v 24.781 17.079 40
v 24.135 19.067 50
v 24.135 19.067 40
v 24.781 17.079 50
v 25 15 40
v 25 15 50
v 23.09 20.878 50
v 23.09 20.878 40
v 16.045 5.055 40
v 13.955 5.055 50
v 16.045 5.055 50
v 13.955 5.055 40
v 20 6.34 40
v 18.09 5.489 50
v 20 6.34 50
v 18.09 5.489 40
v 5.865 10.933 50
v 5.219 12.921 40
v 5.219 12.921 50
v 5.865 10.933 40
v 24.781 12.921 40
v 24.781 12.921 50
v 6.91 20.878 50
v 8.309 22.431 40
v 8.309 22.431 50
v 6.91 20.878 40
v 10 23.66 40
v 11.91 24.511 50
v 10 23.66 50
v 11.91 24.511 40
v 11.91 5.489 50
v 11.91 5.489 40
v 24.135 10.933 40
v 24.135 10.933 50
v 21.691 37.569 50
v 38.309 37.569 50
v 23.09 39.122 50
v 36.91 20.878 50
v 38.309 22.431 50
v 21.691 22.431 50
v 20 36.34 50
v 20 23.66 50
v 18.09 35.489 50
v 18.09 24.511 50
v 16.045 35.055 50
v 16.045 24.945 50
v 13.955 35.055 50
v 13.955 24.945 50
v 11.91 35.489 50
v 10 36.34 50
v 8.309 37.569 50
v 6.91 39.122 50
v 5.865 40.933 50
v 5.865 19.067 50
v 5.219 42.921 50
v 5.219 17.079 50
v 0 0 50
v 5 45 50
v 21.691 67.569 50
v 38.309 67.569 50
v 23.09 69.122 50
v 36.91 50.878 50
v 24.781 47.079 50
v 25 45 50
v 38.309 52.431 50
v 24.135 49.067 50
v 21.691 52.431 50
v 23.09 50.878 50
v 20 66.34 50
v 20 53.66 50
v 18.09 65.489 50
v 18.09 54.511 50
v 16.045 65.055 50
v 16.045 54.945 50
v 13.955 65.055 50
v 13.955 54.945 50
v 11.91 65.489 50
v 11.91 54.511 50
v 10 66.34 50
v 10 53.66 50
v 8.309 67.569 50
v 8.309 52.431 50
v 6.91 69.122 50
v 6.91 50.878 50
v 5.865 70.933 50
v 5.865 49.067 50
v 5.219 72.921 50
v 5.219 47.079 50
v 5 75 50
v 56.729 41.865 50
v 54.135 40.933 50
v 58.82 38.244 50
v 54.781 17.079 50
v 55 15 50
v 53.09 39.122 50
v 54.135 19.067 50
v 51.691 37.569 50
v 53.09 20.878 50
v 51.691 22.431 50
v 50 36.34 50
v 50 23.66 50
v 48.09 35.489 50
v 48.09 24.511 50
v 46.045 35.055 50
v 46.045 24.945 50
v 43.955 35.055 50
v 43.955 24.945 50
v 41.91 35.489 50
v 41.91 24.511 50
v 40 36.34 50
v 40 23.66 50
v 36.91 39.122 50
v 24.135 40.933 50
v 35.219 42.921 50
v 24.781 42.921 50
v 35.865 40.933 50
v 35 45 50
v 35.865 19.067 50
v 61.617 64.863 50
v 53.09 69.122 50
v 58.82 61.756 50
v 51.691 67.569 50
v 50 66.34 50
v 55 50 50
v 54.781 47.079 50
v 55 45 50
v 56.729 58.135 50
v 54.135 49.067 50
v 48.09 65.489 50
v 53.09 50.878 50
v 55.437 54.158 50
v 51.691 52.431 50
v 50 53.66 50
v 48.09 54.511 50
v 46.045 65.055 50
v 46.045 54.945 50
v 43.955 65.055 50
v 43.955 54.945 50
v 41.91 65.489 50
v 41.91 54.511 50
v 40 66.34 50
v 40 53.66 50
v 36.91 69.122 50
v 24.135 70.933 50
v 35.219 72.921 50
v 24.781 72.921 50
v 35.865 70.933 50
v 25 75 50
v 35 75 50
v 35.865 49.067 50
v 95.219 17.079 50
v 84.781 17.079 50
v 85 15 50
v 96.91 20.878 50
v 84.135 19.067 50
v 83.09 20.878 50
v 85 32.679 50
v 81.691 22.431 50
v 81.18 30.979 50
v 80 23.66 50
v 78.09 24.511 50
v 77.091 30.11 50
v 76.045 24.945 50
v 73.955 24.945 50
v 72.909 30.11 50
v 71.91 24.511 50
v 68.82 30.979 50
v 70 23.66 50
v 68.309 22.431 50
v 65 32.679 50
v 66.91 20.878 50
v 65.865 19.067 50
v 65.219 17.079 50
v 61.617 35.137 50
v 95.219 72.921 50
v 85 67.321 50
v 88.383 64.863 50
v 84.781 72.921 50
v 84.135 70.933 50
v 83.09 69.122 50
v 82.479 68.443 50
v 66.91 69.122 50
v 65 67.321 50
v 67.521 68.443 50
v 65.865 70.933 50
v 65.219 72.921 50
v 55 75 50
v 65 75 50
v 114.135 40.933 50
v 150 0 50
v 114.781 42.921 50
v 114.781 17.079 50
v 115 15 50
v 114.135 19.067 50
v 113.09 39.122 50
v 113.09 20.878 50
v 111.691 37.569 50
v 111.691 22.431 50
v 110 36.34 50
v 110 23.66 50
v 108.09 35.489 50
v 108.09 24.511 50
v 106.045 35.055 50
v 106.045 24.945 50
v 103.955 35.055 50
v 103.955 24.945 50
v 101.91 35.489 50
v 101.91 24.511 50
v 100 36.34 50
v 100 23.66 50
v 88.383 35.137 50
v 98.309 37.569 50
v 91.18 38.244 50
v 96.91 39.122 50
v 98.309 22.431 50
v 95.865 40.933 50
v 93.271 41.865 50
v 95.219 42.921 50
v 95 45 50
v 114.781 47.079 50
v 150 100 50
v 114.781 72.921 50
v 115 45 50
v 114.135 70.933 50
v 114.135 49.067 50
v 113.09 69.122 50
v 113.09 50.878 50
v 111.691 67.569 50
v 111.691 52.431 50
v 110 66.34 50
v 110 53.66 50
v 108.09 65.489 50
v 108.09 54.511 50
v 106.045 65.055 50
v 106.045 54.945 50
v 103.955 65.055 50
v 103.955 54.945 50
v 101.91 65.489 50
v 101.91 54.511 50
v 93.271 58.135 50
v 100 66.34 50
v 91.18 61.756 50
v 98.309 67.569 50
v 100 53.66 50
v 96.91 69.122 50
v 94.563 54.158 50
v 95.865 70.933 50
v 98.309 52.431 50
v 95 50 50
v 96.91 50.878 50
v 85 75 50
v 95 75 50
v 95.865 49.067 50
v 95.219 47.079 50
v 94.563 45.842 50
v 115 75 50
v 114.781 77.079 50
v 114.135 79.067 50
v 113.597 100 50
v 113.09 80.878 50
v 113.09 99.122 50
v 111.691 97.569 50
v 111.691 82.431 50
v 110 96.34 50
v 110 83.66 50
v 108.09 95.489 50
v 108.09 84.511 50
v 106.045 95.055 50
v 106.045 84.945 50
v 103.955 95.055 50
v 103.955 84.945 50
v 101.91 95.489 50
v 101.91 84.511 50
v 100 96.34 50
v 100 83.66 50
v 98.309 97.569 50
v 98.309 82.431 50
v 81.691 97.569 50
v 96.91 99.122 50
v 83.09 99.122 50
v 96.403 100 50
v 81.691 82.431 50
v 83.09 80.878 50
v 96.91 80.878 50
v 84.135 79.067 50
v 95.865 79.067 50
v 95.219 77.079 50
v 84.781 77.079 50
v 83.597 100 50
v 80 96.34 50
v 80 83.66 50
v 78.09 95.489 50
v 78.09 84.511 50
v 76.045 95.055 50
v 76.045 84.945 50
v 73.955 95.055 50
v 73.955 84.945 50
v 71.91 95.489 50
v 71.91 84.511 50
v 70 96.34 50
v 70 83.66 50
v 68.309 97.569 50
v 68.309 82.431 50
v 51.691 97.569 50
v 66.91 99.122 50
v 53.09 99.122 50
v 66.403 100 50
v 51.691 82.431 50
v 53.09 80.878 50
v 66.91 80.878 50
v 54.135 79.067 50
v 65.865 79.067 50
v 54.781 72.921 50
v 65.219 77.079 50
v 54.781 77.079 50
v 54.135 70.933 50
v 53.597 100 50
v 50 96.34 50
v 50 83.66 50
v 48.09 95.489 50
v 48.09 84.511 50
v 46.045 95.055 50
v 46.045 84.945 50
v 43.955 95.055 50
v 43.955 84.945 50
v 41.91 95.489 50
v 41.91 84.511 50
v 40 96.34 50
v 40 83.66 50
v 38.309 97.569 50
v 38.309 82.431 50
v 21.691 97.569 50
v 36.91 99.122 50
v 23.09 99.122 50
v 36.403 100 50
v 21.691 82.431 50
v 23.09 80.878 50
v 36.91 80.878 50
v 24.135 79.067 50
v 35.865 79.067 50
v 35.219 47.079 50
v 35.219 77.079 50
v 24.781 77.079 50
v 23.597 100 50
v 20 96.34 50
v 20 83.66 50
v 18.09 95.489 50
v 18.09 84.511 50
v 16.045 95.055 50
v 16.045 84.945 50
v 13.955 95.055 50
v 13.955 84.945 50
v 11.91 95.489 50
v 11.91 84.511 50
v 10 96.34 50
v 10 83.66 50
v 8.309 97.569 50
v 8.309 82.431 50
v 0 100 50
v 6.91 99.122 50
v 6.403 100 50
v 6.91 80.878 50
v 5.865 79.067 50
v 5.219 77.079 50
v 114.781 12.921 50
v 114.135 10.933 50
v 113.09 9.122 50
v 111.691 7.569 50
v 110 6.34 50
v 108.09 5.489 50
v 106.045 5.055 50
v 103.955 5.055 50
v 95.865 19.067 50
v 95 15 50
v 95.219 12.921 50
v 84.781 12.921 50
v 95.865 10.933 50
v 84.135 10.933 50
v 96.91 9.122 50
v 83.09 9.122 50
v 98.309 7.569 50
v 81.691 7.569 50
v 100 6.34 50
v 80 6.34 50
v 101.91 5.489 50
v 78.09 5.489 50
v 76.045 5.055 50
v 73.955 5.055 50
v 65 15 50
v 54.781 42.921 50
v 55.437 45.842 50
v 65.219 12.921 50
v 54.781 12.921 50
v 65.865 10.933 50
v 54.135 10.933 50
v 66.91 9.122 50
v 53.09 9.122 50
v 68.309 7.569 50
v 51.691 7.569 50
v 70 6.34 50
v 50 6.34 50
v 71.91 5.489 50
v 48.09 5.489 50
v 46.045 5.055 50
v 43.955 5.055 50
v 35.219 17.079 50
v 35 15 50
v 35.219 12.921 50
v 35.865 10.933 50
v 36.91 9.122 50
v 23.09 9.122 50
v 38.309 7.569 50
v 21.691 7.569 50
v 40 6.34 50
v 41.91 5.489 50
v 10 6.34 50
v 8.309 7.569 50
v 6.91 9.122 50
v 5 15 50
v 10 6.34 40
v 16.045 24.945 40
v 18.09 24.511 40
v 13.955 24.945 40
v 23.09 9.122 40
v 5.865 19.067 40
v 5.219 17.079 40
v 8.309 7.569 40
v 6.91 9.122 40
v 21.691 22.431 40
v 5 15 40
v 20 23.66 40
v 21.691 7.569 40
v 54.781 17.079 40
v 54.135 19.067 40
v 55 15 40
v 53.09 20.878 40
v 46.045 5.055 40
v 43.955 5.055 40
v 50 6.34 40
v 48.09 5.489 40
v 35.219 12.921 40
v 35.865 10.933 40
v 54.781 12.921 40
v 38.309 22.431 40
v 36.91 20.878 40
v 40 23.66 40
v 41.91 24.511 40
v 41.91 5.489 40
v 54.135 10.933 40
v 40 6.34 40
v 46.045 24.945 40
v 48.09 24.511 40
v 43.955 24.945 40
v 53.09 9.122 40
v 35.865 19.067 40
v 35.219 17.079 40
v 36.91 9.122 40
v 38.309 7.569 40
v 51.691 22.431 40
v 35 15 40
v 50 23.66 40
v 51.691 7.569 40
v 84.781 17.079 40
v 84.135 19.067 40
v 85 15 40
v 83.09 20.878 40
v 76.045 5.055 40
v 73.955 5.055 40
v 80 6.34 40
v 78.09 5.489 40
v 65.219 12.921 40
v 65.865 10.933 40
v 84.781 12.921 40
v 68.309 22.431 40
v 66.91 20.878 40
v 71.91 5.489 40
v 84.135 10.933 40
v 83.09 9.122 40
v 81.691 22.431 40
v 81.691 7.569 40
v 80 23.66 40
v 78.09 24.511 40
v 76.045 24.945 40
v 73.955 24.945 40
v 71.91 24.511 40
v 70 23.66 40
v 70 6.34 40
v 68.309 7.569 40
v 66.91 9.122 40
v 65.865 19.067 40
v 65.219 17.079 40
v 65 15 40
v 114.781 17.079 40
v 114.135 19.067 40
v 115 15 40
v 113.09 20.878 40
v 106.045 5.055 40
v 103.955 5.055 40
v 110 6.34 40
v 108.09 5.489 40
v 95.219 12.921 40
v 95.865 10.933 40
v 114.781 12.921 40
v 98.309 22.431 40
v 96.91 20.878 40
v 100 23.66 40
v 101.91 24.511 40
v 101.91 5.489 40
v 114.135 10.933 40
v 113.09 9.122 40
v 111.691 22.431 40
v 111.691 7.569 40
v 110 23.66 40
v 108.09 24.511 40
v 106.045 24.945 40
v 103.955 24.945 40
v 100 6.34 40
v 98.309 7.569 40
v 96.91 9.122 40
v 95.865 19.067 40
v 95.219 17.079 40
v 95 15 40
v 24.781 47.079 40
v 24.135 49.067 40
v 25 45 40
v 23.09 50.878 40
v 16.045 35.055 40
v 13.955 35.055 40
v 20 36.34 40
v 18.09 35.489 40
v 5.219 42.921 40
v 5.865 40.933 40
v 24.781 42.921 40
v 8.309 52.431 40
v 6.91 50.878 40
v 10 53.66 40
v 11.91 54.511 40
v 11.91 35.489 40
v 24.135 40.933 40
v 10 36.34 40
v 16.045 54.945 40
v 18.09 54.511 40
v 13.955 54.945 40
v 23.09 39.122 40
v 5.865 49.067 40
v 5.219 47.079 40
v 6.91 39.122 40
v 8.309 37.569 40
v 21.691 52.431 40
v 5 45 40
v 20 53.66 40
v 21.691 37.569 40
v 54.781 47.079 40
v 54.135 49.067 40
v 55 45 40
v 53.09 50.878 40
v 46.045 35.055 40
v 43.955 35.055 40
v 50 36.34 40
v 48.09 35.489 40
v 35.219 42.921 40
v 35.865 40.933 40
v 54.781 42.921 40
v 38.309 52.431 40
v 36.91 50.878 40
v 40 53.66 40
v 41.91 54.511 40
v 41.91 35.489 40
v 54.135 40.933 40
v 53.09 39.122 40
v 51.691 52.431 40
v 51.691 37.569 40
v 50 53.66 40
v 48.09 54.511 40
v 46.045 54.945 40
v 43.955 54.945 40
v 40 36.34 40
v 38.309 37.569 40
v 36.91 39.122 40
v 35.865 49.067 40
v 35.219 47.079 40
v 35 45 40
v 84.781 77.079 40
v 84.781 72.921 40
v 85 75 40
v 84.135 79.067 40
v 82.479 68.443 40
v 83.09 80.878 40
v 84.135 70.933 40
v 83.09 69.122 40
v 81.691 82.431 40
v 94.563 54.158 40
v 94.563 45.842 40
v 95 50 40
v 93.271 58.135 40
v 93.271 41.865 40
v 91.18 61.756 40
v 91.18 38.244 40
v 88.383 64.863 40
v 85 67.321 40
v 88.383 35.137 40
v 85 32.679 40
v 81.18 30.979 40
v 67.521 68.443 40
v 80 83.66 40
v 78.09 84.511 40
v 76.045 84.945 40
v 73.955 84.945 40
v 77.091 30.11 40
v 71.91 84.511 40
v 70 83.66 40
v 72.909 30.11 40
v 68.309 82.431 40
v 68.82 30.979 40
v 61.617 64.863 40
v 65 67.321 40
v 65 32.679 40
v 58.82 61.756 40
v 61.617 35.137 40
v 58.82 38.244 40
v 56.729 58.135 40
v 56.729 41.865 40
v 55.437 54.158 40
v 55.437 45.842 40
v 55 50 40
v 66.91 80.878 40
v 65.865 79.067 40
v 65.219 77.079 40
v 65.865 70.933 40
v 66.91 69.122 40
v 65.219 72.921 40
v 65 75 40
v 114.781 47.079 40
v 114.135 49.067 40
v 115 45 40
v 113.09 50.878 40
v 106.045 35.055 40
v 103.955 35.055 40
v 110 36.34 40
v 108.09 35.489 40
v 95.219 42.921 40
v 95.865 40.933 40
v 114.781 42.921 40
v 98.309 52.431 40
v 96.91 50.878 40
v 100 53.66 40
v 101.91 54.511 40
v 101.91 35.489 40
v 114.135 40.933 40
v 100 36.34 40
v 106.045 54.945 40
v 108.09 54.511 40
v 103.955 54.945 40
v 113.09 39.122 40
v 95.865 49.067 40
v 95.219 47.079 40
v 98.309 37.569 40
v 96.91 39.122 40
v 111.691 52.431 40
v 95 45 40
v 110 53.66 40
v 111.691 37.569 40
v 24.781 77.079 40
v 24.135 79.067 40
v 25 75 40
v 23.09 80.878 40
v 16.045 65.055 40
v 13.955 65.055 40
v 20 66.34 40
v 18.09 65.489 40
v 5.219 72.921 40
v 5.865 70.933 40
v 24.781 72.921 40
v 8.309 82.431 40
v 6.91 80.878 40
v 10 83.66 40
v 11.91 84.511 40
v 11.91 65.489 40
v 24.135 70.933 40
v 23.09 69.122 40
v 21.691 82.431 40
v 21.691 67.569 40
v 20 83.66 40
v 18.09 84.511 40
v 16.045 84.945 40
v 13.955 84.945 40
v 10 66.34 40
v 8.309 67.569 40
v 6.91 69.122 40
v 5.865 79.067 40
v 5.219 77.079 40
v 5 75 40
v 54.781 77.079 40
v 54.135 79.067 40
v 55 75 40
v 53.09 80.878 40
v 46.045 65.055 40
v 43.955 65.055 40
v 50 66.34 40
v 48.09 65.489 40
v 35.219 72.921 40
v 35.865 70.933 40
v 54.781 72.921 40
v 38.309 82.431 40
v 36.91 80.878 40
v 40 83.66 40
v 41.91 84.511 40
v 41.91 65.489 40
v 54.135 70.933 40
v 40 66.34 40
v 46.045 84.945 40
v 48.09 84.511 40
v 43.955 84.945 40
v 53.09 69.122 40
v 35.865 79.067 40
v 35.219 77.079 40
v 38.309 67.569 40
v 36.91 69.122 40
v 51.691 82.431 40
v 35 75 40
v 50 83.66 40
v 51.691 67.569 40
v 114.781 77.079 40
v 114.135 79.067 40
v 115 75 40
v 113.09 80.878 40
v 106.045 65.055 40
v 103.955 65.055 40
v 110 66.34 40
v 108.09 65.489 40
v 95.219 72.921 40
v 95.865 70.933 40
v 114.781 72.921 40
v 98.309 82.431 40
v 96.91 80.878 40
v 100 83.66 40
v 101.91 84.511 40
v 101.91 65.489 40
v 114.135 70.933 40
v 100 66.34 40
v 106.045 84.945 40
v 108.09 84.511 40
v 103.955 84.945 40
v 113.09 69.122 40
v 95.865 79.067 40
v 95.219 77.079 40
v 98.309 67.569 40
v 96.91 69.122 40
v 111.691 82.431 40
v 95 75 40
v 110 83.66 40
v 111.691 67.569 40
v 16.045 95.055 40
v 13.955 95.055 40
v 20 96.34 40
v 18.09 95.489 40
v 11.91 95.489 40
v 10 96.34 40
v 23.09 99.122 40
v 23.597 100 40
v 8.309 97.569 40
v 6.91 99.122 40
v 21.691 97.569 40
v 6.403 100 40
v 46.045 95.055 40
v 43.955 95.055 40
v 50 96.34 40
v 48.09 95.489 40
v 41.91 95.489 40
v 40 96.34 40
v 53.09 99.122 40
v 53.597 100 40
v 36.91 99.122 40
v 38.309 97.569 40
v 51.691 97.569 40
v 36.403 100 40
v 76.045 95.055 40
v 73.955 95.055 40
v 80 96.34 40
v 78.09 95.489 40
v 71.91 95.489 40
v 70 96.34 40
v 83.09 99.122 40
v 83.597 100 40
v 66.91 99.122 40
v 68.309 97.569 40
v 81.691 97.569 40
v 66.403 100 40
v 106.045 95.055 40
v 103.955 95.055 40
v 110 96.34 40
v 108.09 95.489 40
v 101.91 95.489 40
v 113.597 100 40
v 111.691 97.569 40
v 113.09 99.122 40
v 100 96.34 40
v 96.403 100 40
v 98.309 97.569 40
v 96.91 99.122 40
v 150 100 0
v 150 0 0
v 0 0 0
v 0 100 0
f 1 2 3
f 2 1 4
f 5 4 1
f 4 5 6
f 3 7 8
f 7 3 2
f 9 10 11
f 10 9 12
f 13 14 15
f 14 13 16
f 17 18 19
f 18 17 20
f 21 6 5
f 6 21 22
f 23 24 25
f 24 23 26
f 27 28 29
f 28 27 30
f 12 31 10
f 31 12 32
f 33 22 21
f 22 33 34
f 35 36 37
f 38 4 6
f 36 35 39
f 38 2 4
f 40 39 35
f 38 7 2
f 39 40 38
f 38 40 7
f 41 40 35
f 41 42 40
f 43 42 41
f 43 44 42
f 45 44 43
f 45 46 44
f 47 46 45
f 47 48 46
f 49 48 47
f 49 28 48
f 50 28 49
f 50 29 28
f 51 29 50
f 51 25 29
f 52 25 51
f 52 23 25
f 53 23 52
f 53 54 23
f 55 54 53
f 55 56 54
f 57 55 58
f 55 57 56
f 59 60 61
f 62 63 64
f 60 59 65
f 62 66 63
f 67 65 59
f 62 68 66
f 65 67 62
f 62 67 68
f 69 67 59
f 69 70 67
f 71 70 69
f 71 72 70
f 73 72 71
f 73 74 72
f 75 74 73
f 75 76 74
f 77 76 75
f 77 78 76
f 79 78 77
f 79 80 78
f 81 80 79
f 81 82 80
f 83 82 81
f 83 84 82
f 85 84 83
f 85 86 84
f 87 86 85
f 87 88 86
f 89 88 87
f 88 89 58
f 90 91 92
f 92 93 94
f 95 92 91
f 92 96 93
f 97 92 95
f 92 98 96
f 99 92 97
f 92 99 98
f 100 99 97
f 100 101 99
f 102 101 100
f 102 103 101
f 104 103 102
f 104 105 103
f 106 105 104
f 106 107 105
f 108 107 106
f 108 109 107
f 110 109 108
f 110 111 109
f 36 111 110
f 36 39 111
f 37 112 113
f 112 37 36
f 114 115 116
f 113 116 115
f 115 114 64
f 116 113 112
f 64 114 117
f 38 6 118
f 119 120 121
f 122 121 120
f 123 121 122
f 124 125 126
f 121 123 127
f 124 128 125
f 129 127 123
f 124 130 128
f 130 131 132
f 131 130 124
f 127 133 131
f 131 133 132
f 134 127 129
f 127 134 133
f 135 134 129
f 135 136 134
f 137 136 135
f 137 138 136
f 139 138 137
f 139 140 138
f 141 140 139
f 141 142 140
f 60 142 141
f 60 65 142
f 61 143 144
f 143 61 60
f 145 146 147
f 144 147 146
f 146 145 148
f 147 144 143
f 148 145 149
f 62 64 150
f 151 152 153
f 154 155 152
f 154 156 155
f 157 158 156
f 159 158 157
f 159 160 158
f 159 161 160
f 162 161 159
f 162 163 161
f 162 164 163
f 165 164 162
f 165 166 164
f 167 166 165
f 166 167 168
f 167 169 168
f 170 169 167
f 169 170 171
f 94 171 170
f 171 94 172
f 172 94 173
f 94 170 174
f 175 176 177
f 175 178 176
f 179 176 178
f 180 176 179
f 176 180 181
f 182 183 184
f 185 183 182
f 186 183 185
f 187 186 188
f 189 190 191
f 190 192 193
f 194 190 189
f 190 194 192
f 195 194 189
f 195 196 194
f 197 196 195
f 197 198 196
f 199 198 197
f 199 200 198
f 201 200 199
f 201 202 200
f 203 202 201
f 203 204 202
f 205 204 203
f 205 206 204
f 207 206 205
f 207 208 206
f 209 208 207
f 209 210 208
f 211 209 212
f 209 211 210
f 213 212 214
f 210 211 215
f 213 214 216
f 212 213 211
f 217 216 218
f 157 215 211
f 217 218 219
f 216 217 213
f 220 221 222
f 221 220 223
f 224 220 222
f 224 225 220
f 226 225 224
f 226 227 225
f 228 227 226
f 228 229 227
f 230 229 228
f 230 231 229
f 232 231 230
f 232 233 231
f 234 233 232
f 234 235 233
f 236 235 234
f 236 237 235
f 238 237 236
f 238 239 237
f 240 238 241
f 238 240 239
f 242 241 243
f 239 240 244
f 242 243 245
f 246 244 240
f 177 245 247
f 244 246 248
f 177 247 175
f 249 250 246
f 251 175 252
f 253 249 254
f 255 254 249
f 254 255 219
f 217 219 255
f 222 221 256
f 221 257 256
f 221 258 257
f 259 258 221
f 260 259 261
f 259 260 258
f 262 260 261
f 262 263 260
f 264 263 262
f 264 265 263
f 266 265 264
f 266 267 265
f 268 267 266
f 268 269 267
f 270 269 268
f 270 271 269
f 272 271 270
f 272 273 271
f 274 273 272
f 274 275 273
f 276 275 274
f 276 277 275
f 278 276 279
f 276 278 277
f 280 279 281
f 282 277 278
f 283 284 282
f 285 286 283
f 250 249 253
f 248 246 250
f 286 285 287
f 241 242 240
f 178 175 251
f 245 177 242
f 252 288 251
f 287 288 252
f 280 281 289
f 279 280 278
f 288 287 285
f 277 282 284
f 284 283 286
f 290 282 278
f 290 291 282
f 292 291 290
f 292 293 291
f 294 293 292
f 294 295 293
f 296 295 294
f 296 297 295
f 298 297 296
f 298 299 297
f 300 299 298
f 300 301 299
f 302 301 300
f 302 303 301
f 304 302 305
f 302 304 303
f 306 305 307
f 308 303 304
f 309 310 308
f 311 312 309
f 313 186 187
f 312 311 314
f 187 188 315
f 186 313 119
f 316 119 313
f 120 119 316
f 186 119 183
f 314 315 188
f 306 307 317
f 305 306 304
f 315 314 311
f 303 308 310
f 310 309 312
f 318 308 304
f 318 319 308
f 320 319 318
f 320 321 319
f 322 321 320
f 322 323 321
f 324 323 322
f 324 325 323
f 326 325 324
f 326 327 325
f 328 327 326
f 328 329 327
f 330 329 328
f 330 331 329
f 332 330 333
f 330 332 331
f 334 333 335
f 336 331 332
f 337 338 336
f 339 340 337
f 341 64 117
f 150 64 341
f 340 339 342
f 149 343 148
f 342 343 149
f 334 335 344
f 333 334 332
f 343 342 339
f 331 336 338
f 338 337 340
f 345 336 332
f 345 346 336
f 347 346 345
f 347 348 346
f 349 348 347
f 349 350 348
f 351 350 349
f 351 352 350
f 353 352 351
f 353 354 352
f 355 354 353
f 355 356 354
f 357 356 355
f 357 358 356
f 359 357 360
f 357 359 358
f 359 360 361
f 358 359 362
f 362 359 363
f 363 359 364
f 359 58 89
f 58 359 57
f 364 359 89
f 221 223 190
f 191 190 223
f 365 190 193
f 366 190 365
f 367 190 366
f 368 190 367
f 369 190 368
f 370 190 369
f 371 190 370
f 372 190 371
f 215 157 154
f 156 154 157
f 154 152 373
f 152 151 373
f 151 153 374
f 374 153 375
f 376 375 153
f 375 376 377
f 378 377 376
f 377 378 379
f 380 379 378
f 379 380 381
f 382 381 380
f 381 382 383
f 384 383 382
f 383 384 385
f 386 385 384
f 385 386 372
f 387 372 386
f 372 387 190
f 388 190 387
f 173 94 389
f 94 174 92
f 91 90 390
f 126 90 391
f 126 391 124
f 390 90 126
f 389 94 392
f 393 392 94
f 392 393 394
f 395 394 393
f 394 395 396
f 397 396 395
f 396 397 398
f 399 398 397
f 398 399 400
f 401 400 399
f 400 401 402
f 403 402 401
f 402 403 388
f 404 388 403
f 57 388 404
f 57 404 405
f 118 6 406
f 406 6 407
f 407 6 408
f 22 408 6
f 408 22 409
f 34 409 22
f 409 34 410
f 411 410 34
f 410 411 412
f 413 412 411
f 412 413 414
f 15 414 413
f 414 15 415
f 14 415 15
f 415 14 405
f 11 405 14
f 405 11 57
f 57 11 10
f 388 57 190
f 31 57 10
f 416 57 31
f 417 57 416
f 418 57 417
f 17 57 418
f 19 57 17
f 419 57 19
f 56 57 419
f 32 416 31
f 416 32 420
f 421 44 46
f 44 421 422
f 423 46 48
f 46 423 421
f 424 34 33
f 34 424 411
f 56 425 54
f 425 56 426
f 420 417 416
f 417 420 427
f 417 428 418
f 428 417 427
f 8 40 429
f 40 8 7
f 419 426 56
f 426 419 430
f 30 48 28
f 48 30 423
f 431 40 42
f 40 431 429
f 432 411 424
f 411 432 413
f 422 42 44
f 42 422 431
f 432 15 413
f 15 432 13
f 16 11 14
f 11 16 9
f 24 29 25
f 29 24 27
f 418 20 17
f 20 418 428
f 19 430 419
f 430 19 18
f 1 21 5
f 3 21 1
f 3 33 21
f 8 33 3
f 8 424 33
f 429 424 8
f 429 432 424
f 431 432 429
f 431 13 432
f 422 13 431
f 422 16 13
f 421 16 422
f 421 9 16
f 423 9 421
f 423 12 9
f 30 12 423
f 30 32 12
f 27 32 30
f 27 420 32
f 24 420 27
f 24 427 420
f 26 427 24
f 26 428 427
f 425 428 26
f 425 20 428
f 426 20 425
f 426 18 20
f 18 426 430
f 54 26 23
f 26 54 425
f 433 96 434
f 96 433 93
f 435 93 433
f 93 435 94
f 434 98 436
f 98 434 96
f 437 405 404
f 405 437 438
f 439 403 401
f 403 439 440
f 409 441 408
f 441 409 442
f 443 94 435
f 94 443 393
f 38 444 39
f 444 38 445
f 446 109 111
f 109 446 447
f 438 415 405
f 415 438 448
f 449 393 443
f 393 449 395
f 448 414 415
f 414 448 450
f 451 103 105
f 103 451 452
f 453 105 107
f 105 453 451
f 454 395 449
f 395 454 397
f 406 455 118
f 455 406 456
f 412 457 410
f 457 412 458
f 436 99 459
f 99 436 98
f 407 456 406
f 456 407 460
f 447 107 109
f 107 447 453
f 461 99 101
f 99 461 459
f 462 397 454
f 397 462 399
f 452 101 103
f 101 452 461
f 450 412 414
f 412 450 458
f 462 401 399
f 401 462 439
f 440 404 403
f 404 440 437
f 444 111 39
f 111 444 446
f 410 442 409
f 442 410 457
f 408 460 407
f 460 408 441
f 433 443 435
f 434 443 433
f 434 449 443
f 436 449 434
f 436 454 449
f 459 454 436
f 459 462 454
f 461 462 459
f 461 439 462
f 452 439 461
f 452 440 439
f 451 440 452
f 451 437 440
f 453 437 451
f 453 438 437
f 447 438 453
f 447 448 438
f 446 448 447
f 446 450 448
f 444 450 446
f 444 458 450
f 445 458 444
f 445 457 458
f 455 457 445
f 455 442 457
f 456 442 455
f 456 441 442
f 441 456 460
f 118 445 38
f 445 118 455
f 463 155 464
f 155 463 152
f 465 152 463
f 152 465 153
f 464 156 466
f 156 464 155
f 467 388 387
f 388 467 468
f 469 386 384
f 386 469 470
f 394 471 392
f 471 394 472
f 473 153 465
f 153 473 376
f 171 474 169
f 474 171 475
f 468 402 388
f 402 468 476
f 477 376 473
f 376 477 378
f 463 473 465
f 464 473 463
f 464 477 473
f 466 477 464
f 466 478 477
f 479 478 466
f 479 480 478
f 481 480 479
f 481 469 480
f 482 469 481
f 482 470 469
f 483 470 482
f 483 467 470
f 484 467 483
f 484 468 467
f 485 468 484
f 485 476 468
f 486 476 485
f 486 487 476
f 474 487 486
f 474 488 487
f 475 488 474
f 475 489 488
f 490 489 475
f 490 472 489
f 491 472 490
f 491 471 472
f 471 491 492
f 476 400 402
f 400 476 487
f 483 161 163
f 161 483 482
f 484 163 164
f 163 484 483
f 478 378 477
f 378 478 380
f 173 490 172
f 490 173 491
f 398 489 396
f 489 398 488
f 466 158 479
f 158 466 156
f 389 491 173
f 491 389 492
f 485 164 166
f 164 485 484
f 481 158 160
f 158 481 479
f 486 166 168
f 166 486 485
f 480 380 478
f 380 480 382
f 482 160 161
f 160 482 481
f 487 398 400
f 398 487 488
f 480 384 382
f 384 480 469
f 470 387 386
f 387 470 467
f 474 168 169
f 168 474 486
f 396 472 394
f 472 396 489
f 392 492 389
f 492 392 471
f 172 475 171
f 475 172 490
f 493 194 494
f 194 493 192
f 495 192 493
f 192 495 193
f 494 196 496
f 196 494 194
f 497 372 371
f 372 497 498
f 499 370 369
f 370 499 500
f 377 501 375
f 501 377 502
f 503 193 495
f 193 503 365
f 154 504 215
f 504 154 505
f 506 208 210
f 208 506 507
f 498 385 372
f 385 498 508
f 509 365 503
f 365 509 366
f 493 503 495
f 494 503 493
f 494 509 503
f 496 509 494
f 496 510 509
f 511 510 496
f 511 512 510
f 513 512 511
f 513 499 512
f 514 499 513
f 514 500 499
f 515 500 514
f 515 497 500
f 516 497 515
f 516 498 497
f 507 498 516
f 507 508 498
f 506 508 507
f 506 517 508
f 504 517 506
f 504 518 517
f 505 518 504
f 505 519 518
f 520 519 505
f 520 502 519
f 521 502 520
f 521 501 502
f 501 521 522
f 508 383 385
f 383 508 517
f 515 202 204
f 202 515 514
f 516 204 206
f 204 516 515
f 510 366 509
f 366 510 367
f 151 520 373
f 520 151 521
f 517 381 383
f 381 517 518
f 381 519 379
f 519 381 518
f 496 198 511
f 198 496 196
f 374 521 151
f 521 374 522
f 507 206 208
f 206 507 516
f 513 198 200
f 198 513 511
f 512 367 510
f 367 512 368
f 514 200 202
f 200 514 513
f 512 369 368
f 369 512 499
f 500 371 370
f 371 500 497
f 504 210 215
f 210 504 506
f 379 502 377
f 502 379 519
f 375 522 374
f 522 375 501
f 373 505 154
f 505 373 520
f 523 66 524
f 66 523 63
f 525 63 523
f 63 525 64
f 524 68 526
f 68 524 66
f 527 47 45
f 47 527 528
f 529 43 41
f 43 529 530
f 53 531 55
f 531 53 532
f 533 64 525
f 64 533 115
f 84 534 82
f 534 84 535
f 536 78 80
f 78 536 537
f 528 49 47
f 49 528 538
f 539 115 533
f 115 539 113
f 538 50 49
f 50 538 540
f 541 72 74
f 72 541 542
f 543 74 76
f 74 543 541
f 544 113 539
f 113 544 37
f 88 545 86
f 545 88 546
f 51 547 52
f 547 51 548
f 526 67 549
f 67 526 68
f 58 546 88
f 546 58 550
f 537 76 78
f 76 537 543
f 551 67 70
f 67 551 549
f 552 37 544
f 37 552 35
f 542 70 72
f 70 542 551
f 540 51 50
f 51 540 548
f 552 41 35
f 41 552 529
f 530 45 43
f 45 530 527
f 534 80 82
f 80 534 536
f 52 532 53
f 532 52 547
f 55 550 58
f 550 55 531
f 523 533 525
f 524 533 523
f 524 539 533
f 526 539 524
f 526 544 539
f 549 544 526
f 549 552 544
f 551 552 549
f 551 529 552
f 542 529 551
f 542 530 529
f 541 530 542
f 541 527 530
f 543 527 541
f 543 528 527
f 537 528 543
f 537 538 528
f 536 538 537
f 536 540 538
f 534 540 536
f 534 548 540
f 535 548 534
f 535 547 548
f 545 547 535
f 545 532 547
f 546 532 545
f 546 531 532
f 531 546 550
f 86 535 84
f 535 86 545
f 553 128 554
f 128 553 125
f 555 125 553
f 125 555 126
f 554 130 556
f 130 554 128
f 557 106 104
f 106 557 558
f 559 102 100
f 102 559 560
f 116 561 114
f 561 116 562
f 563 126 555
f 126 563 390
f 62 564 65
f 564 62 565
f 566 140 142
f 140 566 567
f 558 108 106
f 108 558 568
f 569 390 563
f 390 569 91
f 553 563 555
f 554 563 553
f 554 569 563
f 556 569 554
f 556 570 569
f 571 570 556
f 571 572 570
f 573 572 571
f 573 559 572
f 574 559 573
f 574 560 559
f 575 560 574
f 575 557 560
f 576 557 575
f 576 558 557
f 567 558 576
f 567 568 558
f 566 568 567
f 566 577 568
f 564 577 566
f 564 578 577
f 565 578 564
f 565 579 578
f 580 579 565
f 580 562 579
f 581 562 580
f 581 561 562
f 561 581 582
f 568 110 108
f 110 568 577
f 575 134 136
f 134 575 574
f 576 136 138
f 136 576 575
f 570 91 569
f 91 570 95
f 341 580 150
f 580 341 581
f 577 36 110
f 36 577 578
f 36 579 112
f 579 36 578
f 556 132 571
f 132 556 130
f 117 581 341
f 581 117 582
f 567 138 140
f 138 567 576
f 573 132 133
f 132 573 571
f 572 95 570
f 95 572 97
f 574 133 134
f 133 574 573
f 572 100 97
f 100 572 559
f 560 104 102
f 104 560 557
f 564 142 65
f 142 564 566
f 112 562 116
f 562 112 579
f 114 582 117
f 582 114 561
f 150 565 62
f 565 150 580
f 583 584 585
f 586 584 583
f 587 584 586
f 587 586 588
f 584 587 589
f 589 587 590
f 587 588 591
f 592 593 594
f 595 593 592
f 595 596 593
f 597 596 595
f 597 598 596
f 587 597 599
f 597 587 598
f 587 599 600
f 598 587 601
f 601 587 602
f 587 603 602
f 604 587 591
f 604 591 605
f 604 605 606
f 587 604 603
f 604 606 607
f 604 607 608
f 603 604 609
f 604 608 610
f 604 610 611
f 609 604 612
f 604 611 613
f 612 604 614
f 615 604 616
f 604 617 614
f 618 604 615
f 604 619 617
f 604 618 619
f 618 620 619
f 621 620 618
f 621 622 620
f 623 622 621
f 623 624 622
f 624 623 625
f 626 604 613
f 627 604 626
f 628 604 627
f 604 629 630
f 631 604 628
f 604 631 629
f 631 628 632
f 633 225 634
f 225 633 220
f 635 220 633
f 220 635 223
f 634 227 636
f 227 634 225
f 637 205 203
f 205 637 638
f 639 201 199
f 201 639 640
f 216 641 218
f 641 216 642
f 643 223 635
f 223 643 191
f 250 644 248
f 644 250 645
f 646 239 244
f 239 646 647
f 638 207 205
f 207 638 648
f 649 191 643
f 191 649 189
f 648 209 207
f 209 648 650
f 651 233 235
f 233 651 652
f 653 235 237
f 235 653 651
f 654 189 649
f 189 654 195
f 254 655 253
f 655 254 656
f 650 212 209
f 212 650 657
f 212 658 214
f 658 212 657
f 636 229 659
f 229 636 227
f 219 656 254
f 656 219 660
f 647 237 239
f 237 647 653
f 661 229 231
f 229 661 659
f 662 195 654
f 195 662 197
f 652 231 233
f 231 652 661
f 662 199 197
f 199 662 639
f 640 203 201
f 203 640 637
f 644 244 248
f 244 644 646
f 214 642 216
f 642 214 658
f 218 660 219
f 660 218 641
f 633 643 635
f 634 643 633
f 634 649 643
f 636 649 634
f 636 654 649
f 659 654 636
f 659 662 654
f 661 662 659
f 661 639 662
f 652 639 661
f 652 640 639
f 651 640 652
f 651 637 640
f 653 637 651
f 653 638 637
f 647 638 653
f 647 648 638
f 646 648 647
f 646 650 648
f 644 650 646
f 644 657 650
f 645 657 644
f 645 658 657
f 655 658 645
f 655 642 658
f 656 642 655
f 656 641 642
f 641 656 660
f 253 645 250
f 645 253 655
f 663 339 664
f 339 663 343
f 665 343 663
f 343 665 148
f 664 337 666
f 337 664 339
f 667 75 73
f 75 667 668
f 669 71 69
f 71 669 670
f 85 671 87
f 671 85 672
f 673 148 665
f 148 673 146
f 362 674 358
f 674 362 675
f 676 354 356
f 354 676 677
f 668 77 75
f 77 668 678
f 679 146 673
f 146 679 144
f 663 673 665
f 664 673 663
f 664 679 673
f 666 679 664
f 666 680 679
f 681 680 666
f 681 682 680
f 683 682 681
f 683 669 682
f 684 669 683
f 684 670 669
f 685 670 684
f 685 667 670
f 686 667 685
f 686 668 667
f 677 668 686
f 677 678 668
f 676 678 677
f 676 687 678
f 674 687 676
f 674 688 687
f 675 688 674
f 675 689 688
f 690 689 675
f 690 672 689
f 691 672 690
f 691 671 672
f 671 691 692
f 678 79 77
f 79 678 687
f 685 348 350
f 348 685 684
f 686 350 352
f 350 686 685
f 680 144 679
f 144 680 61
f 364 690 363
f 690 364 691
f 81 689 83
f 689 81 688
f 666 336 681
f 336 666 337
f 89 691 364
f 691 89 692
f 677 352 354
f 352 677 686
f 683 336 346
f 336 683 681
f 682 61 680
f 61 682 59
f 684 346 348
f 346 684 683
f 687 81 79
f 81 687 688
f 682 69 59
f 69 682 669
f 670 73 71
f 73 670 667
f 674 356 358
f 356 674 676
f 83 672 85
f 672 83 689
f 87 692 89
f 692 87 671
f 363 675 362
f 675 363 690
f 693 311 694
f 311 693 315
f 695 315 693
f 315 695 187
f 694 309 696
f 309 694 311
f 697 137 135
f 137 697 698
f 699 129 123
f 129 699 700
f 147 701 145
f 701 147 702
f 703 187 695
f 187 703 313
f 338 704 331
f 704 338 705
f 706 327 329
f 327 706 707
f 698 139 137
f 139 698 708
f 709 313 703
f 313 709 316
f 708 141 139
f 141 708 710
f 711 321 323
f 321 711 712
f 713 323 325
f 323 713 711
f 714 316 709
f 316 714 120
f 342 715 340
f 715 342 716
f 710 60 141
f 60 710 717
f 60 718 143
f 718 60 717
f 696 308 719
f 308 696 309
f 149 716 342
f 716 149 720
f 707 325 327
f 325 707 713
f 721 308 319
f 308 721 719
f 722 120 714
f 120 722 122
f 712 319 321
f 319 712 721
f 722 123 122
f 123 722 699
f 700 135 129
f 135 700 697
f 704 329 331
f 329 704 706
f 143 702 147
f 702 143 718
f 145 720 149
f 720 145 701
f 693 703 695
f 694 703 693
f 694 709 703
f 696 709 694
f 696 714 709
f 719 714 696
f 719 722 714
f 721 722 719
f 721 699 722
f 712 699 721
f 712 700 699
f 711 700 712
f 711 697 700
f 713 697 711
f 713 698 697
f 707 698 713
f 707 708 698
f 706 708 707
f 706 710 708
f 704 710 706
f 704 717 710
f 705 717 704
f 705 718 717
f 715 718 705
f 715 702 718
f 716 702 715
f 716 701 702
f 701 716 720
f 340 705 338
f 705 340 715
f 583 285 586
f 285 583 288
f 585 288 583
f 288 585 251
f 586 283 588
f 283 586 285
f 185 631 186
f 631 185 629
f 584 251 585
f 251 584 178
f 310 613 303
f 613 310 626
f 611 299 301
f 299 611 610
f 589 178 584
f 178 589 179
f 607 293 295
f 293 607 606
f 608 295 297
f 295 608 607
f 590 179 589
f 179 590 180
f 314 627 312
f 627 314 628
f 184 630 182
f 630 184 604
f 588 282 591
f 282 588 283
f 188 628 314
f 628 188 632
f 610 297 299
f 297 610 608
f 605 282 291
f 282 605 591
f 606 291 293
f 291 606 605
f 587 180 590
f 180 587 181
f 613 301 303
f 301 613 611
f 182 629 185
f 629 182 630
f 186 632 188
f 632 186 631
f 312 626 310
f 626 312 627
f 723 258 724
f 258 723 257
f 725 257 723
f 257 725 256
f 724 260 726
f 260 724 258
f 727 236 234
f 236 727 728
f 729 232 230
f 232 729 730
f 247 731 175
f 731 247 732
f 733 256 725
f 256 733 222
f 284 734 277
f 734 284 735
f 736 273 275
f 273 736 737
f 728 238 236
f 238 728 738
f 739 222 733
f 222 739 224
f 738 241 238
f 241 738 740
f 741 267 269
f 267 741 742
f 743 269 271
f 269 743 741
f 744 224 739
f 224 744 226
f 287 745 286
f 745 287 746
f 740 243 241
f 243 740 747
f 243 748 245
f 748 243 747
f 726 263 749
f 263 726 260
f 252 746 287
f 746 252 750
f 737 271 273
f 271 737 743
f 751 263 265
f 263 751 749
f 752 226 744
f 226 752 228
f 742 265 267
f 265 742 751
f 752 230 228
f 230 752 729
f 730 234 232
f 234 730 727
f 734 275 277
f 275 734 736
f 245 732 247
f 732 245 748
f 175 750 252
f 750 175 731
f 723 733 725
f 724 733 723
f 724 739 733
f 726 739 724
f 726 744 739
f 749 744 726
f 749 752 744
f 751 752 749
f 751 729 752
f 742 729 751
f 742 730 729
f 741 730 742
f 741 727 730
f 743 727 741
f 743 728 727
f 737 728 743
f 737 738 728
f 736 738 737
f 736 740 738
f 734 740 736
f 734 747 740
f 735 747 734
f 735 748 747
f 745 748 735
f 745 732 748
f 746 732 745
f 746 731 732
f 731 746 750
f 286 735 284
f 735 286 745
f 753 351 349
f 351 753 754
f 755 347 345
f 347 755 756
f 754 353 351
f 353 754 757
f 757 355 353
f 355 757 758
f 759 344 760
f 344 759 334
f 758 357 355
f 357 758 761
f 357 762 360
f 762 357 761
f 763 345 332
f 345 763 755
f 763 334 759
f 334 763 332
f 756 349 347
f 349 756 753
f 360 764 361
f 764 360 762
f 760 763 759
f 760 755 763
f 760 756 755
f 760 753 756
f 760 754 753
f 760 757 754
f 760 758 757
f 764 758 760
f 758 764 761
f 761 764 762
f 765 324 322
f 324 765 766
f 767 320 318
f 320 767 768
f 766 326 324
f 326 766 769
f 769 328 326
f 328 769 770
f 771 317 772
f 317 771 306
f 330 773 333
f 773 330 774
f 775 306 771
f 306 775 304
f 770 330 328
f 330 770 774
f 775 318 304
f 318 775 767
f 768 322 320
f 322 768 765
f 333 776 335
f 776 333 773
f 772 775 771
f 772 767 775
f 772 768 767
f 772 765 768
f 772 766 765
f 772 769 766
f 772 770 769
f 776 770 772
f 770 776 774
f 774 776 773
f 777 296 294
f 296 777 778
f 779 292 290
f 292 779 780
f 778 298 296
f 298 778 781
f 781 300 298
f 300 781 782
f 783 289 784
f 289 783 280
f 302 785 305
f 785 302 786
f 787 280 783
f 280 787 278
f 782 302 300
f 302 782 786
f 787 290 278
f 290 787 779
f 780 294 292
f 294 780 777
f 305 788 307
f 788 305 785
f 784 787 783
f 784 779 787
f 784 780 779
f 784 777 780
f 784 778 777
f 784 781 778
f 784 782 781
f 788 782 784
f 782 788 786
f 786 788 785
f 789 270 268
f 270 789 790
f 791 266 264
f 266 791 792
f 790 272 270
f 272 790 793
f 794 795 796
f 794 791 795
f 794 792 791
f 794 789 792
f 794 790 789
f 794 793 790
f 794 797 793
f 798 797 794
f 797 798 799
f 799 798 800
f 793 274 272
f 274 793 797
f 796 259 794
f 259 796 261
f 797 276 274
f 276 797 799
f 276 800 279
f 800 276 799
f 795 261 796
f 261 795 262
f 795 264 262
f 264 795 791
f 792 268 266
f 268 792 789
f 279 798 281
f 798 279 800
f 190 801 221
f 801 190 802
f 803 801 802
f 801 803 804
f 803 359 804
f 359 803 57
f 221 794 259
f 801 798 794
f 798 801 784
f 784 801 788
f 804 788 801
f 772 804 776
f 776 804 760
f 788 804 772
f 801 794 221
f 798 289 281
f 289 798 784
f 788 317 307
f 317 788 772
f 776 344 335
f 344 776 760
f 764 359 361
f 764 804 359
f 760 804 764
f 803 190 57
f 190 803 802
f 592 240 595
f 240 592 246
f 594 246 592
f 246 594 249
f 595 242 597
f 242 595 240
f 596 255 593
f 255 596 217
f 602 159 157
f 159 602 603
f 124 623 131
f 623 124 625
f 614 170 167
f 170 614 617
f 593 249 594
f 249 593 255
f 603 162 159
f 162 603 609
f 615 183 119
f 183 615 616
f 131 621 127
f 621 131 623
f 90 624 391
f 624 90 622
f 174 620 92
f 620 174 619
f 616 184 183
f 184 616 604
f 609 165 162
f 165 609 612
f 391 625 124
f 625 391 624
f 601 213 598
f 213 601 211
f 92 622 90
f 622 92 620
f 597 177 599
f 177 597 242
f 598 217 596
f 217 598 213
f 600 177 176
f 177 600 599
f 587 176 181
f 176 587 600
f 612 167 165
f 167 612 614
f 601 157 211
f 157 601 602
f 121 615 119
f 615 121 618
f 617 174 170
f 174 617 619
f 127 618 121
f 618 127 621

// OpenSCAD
// Tube Rack with Parameters

// Parameters
module tube_rack(
    base_length = 150,   // Length of the rack
    base_width = 100,    // Width of the rack
    base_height = 50,    // Height of the rack
    hole_diameter = 20,  // Diameter of the tube holes
    hole_depth = 10,     // Depth of the tube holes
    rows = 4,            // Number of rows of holes
    columns = 4,         // Number of columns of holes
    row_spacing = 30,    // Spacing between rows
    column_spacing = 30, // Spacing between columns
    center_hole = true,  // Checkbox for center hole
    center_hole_diameter = 40 // Diameter of the center hole
) {
    // Base
    difference() {
        // Base block
        cube([base_length, base_width, base_height], center = false);

        // Holes for tubes
        for (row = [0:rows - 1]) {
            for (col = [0:columns - 1]) {
                translate([
                    (col + 0.5) * column_spacing,
                    (row + 0.5) * row_spacing,
                    base_height - hole_depth
                ])
                cylinder(h = hole_depth, d = hole_diameter, center = false);
            }
        }

        // Optional center hole
        if (center_hole) {
            translate([base_length / 2, base_width / 2, base_height - hole_depth])
                cylinder(h = base_height, d = center_hole_diameter, center = false);
        }
    }
}

// Call the tube_rack module
tube_rack(
    base_length = 150,
    base_width = 100,
    base_height = 50,
    hole_diameter = 20,
    hole_depth = 10,
    rows = 4,
    columns = 4,
    row_spacing = 30,
    column_spacing = 30,
    center_hole = true,
    center_hole_diameter = 40
);
